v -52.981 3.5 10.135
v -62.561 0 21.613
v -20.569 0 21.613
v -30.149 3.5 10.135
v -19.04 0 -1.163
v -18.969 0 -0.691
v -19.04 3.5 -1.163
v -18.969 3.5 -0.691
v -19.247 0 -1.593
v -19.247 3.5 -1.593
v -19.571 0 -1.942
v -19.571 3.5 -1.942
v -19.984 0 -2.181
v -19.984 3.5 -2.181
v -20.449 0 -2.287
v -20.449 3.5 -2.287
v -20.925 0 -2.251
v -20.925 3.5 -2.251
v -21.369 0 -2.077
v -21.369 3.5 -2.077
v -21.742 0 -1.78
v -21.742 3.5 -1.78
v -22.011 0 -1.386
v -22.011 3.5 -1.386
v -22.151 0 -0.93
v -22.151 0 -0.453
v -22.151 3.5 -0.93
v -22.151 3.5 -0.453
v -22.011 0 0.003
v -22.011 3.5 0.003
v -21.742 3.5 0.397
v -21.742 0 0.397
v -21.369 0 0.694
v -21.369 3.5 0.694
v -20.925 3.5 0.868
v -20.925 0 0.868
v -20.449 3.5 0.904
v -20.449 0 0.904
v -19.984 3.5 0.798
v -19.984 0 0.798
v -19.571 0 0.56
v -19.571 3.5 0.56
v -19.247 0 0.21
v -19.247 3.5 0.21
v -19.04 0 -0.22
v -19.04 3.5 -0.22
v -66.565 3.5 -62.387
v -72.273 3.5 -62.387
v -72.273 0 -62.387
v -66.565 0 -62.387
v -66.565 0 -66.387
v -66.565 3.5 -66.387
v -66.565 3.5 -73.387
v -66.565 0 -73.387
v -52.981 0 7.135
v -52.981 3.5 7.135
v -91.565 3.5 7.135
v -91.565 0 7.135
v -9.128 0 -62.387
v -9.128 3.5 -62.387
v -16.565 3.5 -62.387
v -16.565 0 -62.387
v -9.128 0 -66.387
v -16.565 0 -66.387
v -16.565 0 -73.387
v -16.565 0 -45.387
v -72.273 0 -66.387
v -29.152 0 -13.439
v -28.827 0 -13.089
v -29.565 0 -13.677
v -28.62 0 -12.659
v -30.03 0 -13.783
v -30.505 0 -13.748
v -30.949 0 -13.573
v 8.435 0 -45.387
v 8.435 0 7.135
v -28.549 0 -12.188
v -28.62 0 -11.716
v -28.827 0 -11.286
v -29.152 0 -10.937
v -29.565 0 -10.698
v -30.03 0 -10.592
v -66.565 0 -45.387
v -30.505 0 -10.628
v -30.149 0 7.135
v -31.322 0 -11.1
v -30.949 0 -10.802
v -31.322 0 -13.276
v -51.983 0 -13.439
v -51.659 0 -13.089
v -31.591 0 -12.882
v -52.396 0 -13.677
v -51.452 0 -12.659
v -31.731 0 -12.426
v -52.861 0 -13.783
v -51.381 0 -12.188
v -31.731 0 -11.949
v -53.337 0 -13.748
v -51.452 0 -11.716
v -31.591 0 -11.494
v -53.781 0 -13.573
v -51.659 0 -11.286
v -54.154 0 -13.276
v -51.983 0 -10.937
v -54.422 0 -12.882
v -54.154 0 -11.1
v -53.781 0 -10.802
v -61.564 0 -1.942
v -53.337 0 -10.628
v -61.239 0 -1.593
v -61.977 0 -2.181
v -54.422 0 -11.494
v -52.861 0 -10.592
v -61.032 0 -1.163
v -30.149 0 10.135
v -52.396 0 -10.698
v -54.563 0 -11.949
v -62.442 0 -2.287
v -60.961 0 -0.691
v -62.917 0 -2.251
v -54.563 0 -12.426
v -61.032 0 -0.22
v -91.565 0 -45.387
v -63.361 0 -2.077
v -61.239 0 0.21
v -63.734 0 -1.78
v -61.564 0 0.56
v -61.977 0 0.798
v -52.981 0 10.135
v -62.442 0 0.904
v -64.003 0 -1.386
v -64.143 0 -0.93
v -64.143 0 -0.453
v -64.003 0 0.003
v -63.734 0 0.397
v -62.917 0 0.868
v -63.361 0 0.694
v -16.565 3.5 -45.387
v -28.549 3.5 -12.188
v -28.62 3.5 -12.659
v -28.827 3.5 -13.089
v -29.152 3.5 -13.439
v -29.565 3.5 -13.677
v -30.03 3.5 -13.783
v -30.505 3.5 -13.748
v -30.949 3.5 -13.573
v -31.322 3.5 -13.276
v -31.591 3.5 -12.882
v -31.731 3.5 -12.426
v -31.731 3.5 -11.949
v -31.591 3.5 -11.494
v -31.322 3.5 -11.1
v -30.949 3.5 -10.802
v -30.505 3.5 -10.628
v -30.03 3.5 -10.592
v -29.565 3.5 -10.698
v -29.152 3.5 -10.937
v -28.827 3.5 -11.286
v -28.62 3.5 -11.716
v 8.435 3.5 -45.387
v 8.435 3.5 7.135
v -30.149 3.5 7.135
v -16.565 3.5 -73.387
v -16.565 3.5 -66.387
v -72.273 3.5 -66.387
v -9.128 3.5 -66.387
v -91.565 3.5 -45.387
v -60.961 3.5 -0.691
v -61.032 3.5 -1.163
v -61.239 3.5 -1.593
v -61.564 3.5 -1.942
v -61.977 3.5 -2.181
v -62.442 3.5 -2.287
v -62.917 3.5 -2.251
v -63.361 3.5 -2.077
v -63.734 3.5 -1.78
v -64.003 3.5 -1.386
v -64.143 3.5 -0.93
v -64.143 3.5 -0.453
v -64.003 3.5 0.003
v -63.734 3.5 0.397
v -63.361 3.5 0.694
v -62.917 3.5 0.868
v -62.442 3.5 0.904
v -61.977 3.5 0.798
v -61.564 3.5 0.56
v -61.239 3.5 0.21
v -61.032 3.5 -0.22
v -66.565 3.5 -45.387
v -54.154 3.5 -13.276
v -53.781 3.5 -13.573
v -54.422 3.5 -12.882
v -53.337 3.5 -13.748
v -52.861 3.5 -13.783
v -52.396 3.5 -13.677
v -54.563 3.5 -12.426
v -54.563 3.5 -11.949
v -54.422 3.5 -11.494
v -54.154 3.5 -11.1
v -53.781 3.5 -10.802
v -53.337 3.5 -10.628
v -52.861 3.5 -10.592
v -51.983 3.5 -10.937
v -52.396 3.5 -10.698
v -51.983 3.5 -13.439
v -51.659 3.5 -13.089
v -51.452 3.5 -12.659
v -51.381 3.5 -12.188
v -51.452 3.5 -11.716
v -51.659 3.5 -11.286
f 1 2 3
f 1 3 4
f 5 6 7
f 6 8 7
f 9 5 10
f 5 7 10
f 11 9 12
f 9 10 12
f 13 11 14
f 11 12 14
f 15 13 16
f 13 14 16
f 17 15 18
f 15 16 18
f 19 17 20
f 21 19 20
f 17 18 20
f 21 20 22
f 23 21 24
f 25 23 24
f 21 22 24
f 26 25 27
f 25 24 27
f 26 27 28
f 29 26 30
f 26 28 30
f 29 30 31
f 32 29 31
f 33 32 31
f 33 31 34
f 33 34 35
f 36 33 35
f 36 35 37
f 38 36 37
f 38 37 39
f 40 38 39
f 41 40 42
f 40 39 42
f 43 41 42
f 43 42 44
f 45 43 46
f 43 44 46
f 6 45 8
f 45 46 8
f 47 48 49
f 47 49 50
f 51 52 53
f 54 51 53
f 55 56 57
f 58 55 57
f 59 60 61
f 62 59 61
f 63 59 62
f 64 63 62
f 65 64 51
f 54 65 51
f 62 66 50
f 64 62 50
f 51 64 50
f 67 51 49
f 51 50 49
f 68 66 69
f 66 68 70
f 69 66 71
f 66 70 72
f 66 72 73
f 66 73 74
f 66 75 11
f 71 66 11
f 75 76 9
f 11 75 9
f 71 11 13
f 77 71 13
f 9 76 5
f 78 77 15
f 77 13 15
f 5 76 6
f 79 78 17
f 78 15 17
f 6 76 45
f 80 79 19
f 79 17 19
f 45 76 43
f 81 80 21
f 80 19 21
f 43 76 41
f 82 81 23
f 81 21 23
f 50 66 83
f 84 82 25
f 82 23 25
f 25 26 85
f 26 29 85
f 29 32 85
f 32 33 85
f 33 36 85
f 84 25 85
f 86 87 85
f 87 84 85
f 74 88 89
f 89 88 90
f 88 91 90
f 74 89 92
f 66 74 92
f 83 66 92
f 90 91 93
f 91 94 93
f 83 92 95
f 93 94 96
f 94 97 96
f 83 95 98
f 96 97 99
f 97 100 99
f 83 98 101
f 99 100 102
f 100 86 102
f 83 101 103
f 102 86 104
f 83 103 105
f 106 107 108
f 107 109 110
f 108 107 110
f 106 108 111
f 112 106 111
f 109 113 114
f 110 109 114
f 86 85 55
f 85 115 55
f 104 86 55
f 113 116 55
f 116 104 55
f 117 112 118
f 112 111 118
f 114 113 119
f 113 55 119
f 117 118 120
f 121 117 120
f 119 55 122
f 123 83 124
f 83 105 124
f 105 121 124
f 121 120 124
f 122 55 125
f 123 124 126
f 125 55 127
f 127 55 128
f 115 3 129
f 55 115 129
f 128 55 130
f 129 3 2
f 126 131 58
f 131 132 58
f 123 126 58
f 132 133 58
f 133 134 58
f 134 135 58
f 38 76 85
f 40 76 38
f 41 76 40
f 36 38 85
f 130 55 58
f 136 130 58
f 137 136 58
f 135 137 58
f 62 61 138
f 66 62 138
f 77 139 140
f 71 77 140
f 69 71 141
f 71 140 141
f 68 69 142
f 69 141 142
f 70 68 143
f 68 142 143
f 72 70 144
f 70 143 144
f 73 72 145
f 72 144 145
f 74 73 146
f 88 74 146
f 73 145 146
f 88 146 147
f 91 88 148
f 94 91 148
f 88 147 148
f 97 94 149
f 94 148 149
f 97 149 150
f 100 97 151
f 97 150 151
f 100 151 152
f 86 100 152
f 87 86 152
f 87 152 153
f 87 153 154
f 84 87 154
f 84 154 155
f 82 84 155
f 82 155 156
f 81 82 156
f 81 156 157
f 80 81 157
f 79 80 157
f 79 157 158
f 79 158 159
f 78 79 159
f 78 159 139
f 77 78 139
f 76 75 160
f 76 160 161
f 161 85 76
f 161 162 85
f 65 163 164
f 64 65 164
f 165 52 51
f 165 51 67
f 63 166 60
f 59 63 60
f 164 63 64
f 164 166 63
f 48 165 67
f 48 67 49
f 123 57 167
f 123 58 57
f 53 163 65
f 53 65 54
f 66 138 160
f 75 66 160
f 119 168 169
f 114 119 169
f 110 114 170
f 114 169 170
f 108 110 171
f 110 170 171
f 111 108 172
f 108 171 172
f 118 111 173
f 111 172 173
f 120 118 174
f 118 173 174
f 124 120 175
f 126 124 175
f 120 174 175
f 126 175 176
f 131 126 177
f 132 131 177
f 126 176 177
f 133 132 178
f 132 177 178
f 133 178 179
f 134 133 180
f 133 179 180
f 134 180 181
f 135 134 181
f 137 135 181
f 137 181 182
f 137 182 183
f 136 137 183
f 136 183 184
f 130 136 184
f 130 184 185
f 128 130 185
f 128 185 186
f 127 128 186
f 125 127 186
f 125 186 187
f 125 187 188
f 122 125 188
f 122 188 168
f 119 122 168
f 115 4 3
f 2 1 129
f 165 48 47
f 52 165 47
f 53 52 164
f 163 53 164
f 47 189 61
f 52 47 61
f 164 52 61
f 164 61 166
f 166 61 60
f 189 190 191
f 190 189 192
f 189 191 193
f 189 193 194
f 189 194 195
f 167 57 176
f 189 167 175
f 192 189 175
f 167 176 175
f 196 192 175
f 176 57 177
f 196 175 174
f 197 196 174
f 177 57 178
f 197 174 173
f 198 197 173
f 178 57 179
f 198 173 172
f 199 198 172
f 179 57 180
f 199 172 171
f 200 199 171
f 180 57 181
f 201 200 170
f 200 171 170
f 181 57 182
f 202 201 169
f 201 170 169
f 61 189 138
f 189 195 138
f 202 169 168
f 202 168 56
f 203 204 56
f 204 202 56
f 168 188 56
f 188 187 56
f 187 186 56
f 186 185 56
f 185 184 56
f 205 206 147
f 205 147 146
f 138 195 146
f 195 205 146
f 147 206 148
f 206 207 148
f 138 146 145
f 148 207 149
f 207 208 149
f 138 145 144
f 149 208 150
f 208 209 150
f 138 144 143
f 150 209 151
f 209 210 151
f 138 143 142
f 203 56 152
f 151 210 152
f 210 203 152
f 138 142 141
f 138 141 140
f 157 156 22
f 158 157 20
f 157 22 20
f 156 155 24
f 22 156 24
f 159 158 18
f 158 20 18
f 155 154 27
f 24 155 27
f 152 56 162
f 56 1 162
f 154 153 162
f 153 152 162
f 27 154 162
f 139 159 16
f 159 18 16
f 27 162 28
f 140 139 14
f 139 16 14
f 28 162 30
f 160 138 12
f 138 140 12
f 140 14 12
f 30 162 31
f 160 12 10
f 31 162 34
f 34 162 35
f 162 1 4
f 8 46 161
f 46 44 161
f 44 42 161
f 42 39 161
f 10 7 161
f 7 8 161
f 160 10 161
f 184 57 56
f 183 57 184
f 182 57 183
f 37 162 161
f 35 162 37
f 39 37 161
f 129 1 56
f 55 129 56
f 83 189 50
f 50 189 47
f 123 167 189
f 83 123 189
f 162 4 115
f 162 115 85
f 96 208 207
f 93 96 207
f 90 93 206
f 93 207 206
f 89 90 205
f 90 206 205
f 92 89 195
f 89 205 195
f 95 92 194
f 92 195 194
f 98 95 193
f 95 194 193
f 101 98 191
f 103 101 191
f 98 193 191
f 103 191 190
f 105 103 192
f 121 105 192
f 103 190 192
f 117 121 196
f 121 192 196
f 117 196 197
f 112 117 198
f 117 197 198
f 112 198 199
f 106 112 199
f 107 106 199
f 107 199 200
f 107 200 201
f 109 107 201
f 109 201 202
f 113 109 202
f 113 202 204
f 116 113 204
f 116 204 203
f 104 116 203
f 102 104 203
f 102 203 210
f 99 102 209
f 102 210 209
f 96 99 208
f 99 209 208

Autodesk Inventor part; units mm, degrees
ref_plane "YZ Plane" through (0, 0, 0) normal (1, 0, 0) x (0, 1, 0)
ref_plane "XZ Plane" through (0, 0, 0) normal (0, 1, 0) x (-1, 0, 0)
ref_plane "XY Plane" through (0, 0, 0) normal (0, 0, 1) x (1, 0, 0)
sketch "Sketch1" plane through (0, 0, 0) normal (0, 1, 0) x (-1, 0, 0)
  line L0 (-8.4349, 11.6133) -> (91.5651, 11.6133)
  line L1 (91.5651, 11.6133) -> (91.5651, -88.3867)
  line L2 (91.5651, -88.3867) -> (-8.4349, -88.3867)
  line L3 (-8.4349, -88.3867) -> (-8.4349, 11.6133)
  point P0 (0, 0)
  dimension "d0" = 100
  dimension "d1" = 100
extrude "Extrusion1" add sketch "Sketch1" along normal blind 3.5
sketch "Sketch2" plane through (-91.5651, 0, -88.3867) normal (-1, 0, 0) x (0, 0, 1)
  line L0 (0, 0) -> (100, 0) projected
  line L1 (100, 0) -> (100, 3.5) projected
  line L2 (0, 3.5) -> (100, 3.5) projected
  line L3 (0, 0) -> (0, 3.5) projected
  line L4 (0, 3.5) -> (100, 3.5) projected
  line L5 (100, 3.5) -> (90, 3.5)
  line L6 (0, 0) -> (100, 0) projected
  line L7 (90, 3.5) -> (100, 0)
  point P0 (88.3867, 0)
  dimension "d4" = 10
extrude "Extrusion2" cut sketch "Sketch2" against normal through all contours L7 L2 L1
sketch "Sketch3" plane through (0, 3.5, 0) normal (0, 1, 0) x (1, 0, 0)
  line L0 (-91.5651, -1.6133) -> (8.4349, -1.6133) projected
  line L1 (8.4349, -1.6133) -> (8.4349, 88.3867) projected
  line L2 (8.4349, 88.3867) -> (-91.5651, 88.3867) projected
  line L3 (-91.5651, 88.3867) -> (-91.5651, -1.6133) projected
  line L4 (8.4349, -1.6133) -> (8.4349, -11.6133) projected
  line L5 (-91.5651, -1.6133) -> (8.4349, -1.6133) projected
  line L6 (-91.5651, -11.6133) -> (-91.5651, -1.6133) projected
  line L7 (-91.5651, -11.6133) -> (8.4349, -11.6133) projected
  line L8 (-91.5651, -11.6133) -> (8.4349, -11.6133) projected
  line L9 (8.4349, 88.3867) -> (-91.5651, 88.3867) projected
  line L10 (-91.5651, 88.3867) -> (-91.5651, -11.6133) projected
  line L11 (-41.5651, -11.6133) -> (8.4349, -11.6133)
  line L12 (-91.5651, -11.6133) -> (-41.5651, -11.6133)
  line L13 (-16.5651, -11.6133) -> (8.4349, -11.6133)
  line L14 (-91.5651, -11.6133) -> (-66.5651, -11.6133)
  line L15 (-16.5651, -11.6133) -> (-4.0651, -11.6133)
  line L16 (-79.0651, -11.6133) -> (-66.5651, -11.6133)
  line L17 (-41.5651, 25.8867) -> (-72.8151, -11.6133)
  line L18 (-41.5651, 25.8867) -> (-10.3151, -11.6133)
  line L19 (-28.2288, 9.8831) -> (-18.6484, -1.6133)
  line L20 (-91.5651, -1.6133) -> (8.4349, -1.6133) projected
  circle A0 centre (-30.1493, 12.1878) radius 1.6
  circle A1 centre (-20.569, 0.6914) radius 1.6
  line L21 (-18.6484, -1.6133) -> (-20.569, 0.6914)
  line L22 (-41.5651, 25.8867) -> (-41.5651, -11.6133)
  circle A2 centre (-52.9808, 12.1878) radius 1.6
  circle A3 centre (-62.5612, 0.6914) radius 1.6
  point P0 (0, 0)
  point P1 (-63.1373, 0)
  dimension "d15" = 3.2
  dimension "d16" = 3.2
  dimension "d17" = 3
extrude "Extrusion3" cut sketch "Sketch3" against normal through all contours A1 L18 | L18 A1 | A3 L17 | L17 A3 | A2 L17 | L17 A2 | A0 L18 | L18 A0
sketch "Sketch4" plane through (0, 0, 0) normal (0, -1, 0) x (1, 0, 0)
  circle A0 centre (-52.9808, -12.1878) radius 1.6 projected
  circle A1 centre (-20.569, -0.6914) radius 1.6 projected
  circle A2 centre (-62.5612, -0.6914) radius 1.6 projected
  circle A3 centre (-30.1493, -12.1878) radius 1.6 projected
  line L0 (8.4349, -88.3867) -> (-91.5651, -88.3867) projected
  line L1 (8.4349, 11.6133) -> (8.4349, -88.3867) projected
  line L2 (-91.5651, 11.6133) -> (8.4349, 11.6133) projected
  line L3 (-91.5651, -88.3867) -> (-91.5651, 11.6133) projected
  line L4 (-91.5651, -88.3867) -> (-91.5651, 11.6133) projected
  line L5 (-91.5651, 11.6133) -> (8.4349, 11.6133)
  line L6 (8.4349, 11.6133) -> (8.4349, 21.6133)
  line L7 (8.4349, 21.6133) -> (-91.5651, 21.6133)
  line L8 (-91.5651, 21.6133) -> (-91.5651, 11.6133)
  line L9 (8.4349, 11.6133) -> (8.4349, -88.3867) projected
  line L10 (-91.5651, -88.3867) -> (8.4349, -88.3867)
  line L11 (8.4349, -88.3867) -> (8.4349, -78.3867)
  line L12 (8.4349, -78.3867) -> (-91.5651, -78.3867)
  line L13 (-91.5651, -78.3867) -> (-91.5651, -88.3867)
  line L14 (-91.5651, 1.6133) -> (8.4349, 1.6133) projected
  line L15 (-91.5651, 11.6133) -> (8.4349, 11.6133)
  line L16 (8.4349, 11.6133) -> (8.4349, 1.6133)
  line L17 (8.4349, 1.6133) -> (-91.5651, 1.6133)
  line L18 (-91.5651, 1.6133) -> (-91.5651, 11.6133)
  ellipse E0 centre (-76.8987, 15.9252) end of major axis (-87.6538, 6.9626) minor radius 2.0831 projected
  point P0 (0, 0)
  dimension "d20" = 10
  dimension "d21" = 10
extrude "Extrusion4" add sketch "Sketch4" against normal up to surface (3.5 mm away) contours L14 L3 L2 E0 L1 | L2 E0 L7 L6 | L8 L7 E0 L2 | E0 L2 | L2 E0 L7
sketch "Sketch5" plane through (0, 0, 0) normal (0, -1, 0) x (1, 0, 0)
  line L0 (-91.5651, -88.3867) -> (-91.5651, 21.6133) projected
  line L1 (8.4349, -88.3867) -> (-91.5651, -88.3867) projected
  line L2 (8.4349, -88.3867) -> (8.4349, 21.6133) projected
  line L3 (8.4349, 21.6133) -> (-91.5651, 21.6133) projected
  circle A0 centre (-30.1493, -12.1878) radius 1.6 projected
  circle A1 centre (-62.5612, -0.6914) radius 1.6 projected
  circle A2 centre (-20.569, -0.6914) radius 1.6 projected
  circle A3 centre (-52.9808, -12.1878) radius 1.6 projected
  line L4 (-91.5651, -88.3867) -> (-91.5651, 21.6133) projected
  line L5 (8.4349, -88.3867) -> (-91.5651, -88.3867)
  line L6 (-91.5651, -88.3867) -> (-91.5651, -78.3867)
  line L7 (-91.5651, -78.3867) -> (8.4349, -78.3867)
  line L8 (8.4349, -78.3867) -> (8.4349, -88.3867)
  point P0 (0, 0)
  dimension "d24" = 10
extrude "Extrusion5" cut sketch "Sketch5" against normal through all contours L0 L7 L2 L1
sketch "Sketch6" plane through (-91.5651, 0, 21.6133) normal (-1, 0, 0) x (0, 0, 1)
  line L0 (-100, 3.5) -> (-100, 0) projected
  line L1 (-100, 0) -> (0, 0) projected
  line L2 (0, 0) -> (0, 3.5) projected
  line L3 (0, 3.5) -> (-100, 3.5) projected
  line L4 (-6.5312, 3.5) -> (-20.2018, 3.5) projected
  line L5 (-6.5312, 8.5) -> (-6.5312, 3.5) projected
  line L6 (-20.2018, 8.5) -> (-6.5312, 8.5) projected
  line L7 (-20.2018, 3.5) -> (-20.2018, 8.5) projected
  line L8 (-100, 0) -> (0, 0) projected
  line L9 (0, 0) -> (-11.4782, 3.5)
  line L10 (0, 3.5) -> (-100, 3.5) projected
  point P0 (-21.6133, 0)
  dimension "d27" = 12
extrude "Extrusion6" cut sketch "Sketch6" against normal through all contours L9 L3 L2
sketch "Sketch7" plane through (0, 3.5, 0) normal (0, 1, 0) x (1, 0, 0)
  line L0 (-91.5651, -10.1351) -> (8.4349, -10.1351) projected
  line L1 (8.4349, -10.1351) -> (8.4349, 78.3867) projected
  line L2 (8.4349, 78.3867) -> (-91.5651, 78.3867) projected
  line L3 (-91.5651, -10.1351) -> (-91.5651, 78.3867) projected
  circle A0 centre (-52.9808, 12.1878) radius 1.6 projected
  circle A1 centre (-20.569, 0.6914) radius 1.6 projected
  circle A2 centre (-62.5612, 0.6914) radius 1.6 projected
  circle A3 centre (-30.1493, 12.1878) radius 1.6 projected
  line L4 (8.4349, -10.1351) -> (8.4349, -21.6133) projected
  line L5 (-91.5651, -10.1351) -> (8.4349, -10.1351) projected
  line L6 (-91.5651, -21.6133) -> (-91.5651, -10.1351) projected
  line L7 (8.4349, -21.6133) -> (-91.5651, -21.6133) projected
  circle A4 centre (-30.1493, 12.1878) radius 1.6 projected
  circle A5 centre (-20.569, 0.6914) radius 1.6 projected
  line L8 (-30.1493, 12.1878) -> (-20.569, 0.6914)
  line L9 (-91.5651, -10.1351) -> (8.4349, -10.1351) projected
  line L10 (-30.1493, -10.1351) -> (-20.569, -21.6133)
  line L11 (8.4349, -21.6133) -> (-91.5651, -21.6133) projected
  circle A6 centre (-62.5612, 0.6914) radius 1.6 projected
  line L12 (-52.9808, 12.1878) -> (-62.5612, 0.6914)
  line L13 (-52.9808, -10.1351) -> (-62.5612, -21.6133)
  point P0 (0, 0)
extrude "Extrusion7" cut sketch "Sketch7" against normal blind 10 contours L0 L13 L7 L6 | L0 L4 L7 L10
sketch "Sketch8" plane through (0, 3.5, 0) normal (0, 1, 0) x (1, 0, 0)
  line L0 (-91.5651, -10.1351) -> (-52.9808, -10.1351) projected
  line L1 (-52.9808, -10.1351) -> (-30.1493, -10.1351) projected
  line L2 (-30.1493, -10.1351) -> (8.4349, -10.1351) projected
  line L3 (8.4349, -10.1351) -> (8.4349, 78.3867) projected
  line L4 (8.4349, 78.3867) -> (-91.5651, 78.3867) projected
  line L5 (-91.5651, -10.1351) -> (-91.5651, 78.3867) projected
  circle A0 centre (-52.9808, 12.1878) radius 1.6 projected
  circle A1 centre (-20.569, 0.6914) radius 1.6 projected
  circle A2 centre (-62.5612, 0.6914) radius 1.6 projected
  circle A3 centre (-30.1493, 12.1878) radius 1.6 projected
  line L6 (8.4349, -10.1351) -> (8.4349, 78.3867) projected
  line L7 (8.4349, -10.1351) -> (-30.1493, -10.1351)
  line L8 (-30.1493, -10.1351) -> (-30.1493, -7.1351)
  line L9 (-30.1493, -7.1351) -> (8.4349, -7.1351)
  line L10 (8.4349, -7.1351) -> (8.4349, -10.1351)
  line L11 (-91.5651, -10.1351) -> (-52.9808, -10.1351)
  line L12 (-52.9808, -10.1351) -> (-52.9808, -7.1351)
  line L13 (-52.9808, -7.1351) -> (-91.5651, -7.1351)
  line L14 (-91.5651, -7.1351) -> (-91.5651, -10.1351)
  point P0 (0, 0)
  dimension "d32" = 3
extrude "Extrusion8" cut sketch "Sketch8" against normal through all contours L5 L13 L12 L0 | L8 L9 L3 L2
sketch "Sketch9" plane through (0, 3.5, 0) normal (0, 1, 0) x (1, 0, 0)
  circle A0 centre (-30.1493, 12.1878) radius 1.6 projected
  circle A1 centre (-62.5612, 0.6914) radius 1.6 projected
  circle A2 centre (-20.569, 0.6914) radius 1.6 projected
  circle A3 centre (-52.9808, 12.1878) radius 1.6 projected
  line L0 (-91.5651, -7.1351) -> (-52.9808, -7.1351) projected
  line L1 (-52.9808, -7.1351) -> (-52.9808, -10.1351) projected
  line L2 (-52.9808, -10.1351) -> (-30.1493, -10.1351) projected
  line L3 (-30.1493, -10.1351) -> (-30.1493, -7.1351) projected
  line L4 (-30.1493, -7.1351) -> (8.4349, -7.1351) projected
  line L5 (8.4349, -7.1351) -> (8.4349, 78.3867) projected
  line L6 (8.4349, 78.3867) -> (-91.5651, 78.3867) projected
  line L7 (-91.5651, -7.1351) -> (-91.5651, 78.3867) projected
  line L8 (-91.5651, 78.3867) -> (-91.5651, -7.1351) projected
  line L9 (8.4349, 78.3867) -> (8.4349, -7.1351) projected
  line L10 (-91.5651, 78.3867) -> (8.4349, 78.3867)
  line L11 (8.4349, 78.3867) -> (8.4349, 73.3867)
  line L12 (8.4349, 73.3867) -> (-91.5651, 73.3867)
  line L13 (-91.5651, 73.3867) -> (-91.5651, 78.3867)
  line L14 (-91.5651, 78.3867) -> (8.4349, 78.3867) projected
  line L15 (-41.5651, 78.3867) -> (-41.5651, 59.9995)
  line L16 (-41.5651, 59.9995) -> (-16.5651, 59.9995)
  line L17 (-16.5651, 59.9995) -> (-66.5651, 59.9995)
  line L18 (8.4349, 73.3867) -> (-16.5651, 73.3867)
  line L19 (-16.5651, 73.3867) -> (-16.5651, 45.3867)
  line L20 (-16.5651, 45.3867) -> (8.4349, 45.3867)
  line L21 (8.4349, 45.3867) -> (8.4349, 73.3867)
  line L22 (-66.5651, 73.3867) -> (-79.5403, 73.3867)
  line L23 (-79.5403, 73.3867) -> (-79.5403, 45.3867)
  line L24 (-79.5403, 45.3867) -> (-66.5651, 45.3867)
  line L25 (-66.5651, 45.3867) -> (-66.5651, 73.3867)
  line L26 (-91.5651, 45.3867) -> (-66.5651, 45.3867)
  line L27 (-66.5651, 45.3867) -> (-66.5651, 78.3867)
  line L28 (-66.5651, 78.3867) -> (-91.5651, 78.3867)
  line L29 (-91.5651, 78.3867) -> (-91.5651, 45.3867)
  line L30 (-14.4969, 45.3867) -> (-14.4969, 50.3867)
  line L31 (-14.4969, 50.3867) -> (-14.4969, 78.3867)
  line L32 (-14.4969, 64.3867) -> (-82.4701, 64.3867)
  line L33 (-82.4701, 64.3867) -> (-3.1512, 64.3867)
  line L34 (-14.4969, 64.3867) -> (-9.1279, 64.3867)
  line L35 (-9.1279, 64.3867) -> (-9.1279, 62.3867)
  line L36 (-9.1279, 62.3867) -> (-14.4969, 62.3867)
  line L37 (-14.4969, 62.3867) -> (-14.4969, 64.3867)
  line L38 (-14.4969, 64.3867) -> (-9.1279, 64.3867)
  line L39 (-9.1279, 64.3867) -> (-9.1279, 66.3867)
  line L40 (-9.1279, 66.3867) -> (-14.4969, 66.3867)
  line L41 (-14.4969, 66.3867) -> (-14.4969, 64.3867)
  line L42 (-66.5651, 64.3867) -> (-72.2729, 64.3867)
  line L43 (-72.2729, 64.3867) -> (-72.2729, 62.3867)
  line L44 (-72.2729, 62.3867) -> (-66.5651, 62.3867)
  line L45 (-66.5651, 62.3867) -> (-66.5651, 64.3867)
  line L46 (-72.2729, 62.3867) -> (-66.5651, 62.3867)
  line L47 (-66.5651, 62.3867) -> (-66.5651, 66.3867)
  line L48 (-66.5651, 66.3867) -> (-72.2729, 66.3867)
  line L49 (-72.2729, 66.3867) -> (-72.2729, 62.3867)
  line L50 (-14.4969, 73.3867) -> (-14.4969, 66.3867)
  line L51 (-9.1279, 66.3867) -> (-14.4969, 66.3867)
  line L52 (-9.1279, 66.3867) -> (-9.1279, 62.3867)
  line L53 (-14.4969, 62.3867) -> (-14.4969, 45.3867)
  line L54 (-14.4969, 62.3867) -> (-9.1279, 62.3867)
  line L55 (-14.4969, 45.3867) -> (8.4349, 45.3867)
  line L56 (-14.4969, 66.3867) -> (-16.5651, 66.3867)
  line L57 (-14.4969, 62.3867) -> (-16.5651, 62.3867)
  point P0 (0, 0)
  dimension "d35" = 5
  dimension "d36" = 25
  dimension "d37" = 50
  dimension "d38" = 28
  dimension "d39" = 28
  dimension "d40" = 5
  dimension "d41" = 2
  dimension "d42" = 2
extrude "Extrusion9" cut sketch "Sketch9" against normal through all contours L7 L12 L23 L26 | L7 L6 L27 L12 | L23 L32 L43 L44 L25 L24 | L12 L25 L48 L49 L32 L23 | L6 L15 L12 L27 | L6 L31 L12 L15 | L20 L30 L31 L36 L35 L39 L40 L12 L5 | L6 L5 L12 L31 | L12 L31 L56 L19 | L19 L57 L31 L30 L20
properties material "Steel, Alloy"
